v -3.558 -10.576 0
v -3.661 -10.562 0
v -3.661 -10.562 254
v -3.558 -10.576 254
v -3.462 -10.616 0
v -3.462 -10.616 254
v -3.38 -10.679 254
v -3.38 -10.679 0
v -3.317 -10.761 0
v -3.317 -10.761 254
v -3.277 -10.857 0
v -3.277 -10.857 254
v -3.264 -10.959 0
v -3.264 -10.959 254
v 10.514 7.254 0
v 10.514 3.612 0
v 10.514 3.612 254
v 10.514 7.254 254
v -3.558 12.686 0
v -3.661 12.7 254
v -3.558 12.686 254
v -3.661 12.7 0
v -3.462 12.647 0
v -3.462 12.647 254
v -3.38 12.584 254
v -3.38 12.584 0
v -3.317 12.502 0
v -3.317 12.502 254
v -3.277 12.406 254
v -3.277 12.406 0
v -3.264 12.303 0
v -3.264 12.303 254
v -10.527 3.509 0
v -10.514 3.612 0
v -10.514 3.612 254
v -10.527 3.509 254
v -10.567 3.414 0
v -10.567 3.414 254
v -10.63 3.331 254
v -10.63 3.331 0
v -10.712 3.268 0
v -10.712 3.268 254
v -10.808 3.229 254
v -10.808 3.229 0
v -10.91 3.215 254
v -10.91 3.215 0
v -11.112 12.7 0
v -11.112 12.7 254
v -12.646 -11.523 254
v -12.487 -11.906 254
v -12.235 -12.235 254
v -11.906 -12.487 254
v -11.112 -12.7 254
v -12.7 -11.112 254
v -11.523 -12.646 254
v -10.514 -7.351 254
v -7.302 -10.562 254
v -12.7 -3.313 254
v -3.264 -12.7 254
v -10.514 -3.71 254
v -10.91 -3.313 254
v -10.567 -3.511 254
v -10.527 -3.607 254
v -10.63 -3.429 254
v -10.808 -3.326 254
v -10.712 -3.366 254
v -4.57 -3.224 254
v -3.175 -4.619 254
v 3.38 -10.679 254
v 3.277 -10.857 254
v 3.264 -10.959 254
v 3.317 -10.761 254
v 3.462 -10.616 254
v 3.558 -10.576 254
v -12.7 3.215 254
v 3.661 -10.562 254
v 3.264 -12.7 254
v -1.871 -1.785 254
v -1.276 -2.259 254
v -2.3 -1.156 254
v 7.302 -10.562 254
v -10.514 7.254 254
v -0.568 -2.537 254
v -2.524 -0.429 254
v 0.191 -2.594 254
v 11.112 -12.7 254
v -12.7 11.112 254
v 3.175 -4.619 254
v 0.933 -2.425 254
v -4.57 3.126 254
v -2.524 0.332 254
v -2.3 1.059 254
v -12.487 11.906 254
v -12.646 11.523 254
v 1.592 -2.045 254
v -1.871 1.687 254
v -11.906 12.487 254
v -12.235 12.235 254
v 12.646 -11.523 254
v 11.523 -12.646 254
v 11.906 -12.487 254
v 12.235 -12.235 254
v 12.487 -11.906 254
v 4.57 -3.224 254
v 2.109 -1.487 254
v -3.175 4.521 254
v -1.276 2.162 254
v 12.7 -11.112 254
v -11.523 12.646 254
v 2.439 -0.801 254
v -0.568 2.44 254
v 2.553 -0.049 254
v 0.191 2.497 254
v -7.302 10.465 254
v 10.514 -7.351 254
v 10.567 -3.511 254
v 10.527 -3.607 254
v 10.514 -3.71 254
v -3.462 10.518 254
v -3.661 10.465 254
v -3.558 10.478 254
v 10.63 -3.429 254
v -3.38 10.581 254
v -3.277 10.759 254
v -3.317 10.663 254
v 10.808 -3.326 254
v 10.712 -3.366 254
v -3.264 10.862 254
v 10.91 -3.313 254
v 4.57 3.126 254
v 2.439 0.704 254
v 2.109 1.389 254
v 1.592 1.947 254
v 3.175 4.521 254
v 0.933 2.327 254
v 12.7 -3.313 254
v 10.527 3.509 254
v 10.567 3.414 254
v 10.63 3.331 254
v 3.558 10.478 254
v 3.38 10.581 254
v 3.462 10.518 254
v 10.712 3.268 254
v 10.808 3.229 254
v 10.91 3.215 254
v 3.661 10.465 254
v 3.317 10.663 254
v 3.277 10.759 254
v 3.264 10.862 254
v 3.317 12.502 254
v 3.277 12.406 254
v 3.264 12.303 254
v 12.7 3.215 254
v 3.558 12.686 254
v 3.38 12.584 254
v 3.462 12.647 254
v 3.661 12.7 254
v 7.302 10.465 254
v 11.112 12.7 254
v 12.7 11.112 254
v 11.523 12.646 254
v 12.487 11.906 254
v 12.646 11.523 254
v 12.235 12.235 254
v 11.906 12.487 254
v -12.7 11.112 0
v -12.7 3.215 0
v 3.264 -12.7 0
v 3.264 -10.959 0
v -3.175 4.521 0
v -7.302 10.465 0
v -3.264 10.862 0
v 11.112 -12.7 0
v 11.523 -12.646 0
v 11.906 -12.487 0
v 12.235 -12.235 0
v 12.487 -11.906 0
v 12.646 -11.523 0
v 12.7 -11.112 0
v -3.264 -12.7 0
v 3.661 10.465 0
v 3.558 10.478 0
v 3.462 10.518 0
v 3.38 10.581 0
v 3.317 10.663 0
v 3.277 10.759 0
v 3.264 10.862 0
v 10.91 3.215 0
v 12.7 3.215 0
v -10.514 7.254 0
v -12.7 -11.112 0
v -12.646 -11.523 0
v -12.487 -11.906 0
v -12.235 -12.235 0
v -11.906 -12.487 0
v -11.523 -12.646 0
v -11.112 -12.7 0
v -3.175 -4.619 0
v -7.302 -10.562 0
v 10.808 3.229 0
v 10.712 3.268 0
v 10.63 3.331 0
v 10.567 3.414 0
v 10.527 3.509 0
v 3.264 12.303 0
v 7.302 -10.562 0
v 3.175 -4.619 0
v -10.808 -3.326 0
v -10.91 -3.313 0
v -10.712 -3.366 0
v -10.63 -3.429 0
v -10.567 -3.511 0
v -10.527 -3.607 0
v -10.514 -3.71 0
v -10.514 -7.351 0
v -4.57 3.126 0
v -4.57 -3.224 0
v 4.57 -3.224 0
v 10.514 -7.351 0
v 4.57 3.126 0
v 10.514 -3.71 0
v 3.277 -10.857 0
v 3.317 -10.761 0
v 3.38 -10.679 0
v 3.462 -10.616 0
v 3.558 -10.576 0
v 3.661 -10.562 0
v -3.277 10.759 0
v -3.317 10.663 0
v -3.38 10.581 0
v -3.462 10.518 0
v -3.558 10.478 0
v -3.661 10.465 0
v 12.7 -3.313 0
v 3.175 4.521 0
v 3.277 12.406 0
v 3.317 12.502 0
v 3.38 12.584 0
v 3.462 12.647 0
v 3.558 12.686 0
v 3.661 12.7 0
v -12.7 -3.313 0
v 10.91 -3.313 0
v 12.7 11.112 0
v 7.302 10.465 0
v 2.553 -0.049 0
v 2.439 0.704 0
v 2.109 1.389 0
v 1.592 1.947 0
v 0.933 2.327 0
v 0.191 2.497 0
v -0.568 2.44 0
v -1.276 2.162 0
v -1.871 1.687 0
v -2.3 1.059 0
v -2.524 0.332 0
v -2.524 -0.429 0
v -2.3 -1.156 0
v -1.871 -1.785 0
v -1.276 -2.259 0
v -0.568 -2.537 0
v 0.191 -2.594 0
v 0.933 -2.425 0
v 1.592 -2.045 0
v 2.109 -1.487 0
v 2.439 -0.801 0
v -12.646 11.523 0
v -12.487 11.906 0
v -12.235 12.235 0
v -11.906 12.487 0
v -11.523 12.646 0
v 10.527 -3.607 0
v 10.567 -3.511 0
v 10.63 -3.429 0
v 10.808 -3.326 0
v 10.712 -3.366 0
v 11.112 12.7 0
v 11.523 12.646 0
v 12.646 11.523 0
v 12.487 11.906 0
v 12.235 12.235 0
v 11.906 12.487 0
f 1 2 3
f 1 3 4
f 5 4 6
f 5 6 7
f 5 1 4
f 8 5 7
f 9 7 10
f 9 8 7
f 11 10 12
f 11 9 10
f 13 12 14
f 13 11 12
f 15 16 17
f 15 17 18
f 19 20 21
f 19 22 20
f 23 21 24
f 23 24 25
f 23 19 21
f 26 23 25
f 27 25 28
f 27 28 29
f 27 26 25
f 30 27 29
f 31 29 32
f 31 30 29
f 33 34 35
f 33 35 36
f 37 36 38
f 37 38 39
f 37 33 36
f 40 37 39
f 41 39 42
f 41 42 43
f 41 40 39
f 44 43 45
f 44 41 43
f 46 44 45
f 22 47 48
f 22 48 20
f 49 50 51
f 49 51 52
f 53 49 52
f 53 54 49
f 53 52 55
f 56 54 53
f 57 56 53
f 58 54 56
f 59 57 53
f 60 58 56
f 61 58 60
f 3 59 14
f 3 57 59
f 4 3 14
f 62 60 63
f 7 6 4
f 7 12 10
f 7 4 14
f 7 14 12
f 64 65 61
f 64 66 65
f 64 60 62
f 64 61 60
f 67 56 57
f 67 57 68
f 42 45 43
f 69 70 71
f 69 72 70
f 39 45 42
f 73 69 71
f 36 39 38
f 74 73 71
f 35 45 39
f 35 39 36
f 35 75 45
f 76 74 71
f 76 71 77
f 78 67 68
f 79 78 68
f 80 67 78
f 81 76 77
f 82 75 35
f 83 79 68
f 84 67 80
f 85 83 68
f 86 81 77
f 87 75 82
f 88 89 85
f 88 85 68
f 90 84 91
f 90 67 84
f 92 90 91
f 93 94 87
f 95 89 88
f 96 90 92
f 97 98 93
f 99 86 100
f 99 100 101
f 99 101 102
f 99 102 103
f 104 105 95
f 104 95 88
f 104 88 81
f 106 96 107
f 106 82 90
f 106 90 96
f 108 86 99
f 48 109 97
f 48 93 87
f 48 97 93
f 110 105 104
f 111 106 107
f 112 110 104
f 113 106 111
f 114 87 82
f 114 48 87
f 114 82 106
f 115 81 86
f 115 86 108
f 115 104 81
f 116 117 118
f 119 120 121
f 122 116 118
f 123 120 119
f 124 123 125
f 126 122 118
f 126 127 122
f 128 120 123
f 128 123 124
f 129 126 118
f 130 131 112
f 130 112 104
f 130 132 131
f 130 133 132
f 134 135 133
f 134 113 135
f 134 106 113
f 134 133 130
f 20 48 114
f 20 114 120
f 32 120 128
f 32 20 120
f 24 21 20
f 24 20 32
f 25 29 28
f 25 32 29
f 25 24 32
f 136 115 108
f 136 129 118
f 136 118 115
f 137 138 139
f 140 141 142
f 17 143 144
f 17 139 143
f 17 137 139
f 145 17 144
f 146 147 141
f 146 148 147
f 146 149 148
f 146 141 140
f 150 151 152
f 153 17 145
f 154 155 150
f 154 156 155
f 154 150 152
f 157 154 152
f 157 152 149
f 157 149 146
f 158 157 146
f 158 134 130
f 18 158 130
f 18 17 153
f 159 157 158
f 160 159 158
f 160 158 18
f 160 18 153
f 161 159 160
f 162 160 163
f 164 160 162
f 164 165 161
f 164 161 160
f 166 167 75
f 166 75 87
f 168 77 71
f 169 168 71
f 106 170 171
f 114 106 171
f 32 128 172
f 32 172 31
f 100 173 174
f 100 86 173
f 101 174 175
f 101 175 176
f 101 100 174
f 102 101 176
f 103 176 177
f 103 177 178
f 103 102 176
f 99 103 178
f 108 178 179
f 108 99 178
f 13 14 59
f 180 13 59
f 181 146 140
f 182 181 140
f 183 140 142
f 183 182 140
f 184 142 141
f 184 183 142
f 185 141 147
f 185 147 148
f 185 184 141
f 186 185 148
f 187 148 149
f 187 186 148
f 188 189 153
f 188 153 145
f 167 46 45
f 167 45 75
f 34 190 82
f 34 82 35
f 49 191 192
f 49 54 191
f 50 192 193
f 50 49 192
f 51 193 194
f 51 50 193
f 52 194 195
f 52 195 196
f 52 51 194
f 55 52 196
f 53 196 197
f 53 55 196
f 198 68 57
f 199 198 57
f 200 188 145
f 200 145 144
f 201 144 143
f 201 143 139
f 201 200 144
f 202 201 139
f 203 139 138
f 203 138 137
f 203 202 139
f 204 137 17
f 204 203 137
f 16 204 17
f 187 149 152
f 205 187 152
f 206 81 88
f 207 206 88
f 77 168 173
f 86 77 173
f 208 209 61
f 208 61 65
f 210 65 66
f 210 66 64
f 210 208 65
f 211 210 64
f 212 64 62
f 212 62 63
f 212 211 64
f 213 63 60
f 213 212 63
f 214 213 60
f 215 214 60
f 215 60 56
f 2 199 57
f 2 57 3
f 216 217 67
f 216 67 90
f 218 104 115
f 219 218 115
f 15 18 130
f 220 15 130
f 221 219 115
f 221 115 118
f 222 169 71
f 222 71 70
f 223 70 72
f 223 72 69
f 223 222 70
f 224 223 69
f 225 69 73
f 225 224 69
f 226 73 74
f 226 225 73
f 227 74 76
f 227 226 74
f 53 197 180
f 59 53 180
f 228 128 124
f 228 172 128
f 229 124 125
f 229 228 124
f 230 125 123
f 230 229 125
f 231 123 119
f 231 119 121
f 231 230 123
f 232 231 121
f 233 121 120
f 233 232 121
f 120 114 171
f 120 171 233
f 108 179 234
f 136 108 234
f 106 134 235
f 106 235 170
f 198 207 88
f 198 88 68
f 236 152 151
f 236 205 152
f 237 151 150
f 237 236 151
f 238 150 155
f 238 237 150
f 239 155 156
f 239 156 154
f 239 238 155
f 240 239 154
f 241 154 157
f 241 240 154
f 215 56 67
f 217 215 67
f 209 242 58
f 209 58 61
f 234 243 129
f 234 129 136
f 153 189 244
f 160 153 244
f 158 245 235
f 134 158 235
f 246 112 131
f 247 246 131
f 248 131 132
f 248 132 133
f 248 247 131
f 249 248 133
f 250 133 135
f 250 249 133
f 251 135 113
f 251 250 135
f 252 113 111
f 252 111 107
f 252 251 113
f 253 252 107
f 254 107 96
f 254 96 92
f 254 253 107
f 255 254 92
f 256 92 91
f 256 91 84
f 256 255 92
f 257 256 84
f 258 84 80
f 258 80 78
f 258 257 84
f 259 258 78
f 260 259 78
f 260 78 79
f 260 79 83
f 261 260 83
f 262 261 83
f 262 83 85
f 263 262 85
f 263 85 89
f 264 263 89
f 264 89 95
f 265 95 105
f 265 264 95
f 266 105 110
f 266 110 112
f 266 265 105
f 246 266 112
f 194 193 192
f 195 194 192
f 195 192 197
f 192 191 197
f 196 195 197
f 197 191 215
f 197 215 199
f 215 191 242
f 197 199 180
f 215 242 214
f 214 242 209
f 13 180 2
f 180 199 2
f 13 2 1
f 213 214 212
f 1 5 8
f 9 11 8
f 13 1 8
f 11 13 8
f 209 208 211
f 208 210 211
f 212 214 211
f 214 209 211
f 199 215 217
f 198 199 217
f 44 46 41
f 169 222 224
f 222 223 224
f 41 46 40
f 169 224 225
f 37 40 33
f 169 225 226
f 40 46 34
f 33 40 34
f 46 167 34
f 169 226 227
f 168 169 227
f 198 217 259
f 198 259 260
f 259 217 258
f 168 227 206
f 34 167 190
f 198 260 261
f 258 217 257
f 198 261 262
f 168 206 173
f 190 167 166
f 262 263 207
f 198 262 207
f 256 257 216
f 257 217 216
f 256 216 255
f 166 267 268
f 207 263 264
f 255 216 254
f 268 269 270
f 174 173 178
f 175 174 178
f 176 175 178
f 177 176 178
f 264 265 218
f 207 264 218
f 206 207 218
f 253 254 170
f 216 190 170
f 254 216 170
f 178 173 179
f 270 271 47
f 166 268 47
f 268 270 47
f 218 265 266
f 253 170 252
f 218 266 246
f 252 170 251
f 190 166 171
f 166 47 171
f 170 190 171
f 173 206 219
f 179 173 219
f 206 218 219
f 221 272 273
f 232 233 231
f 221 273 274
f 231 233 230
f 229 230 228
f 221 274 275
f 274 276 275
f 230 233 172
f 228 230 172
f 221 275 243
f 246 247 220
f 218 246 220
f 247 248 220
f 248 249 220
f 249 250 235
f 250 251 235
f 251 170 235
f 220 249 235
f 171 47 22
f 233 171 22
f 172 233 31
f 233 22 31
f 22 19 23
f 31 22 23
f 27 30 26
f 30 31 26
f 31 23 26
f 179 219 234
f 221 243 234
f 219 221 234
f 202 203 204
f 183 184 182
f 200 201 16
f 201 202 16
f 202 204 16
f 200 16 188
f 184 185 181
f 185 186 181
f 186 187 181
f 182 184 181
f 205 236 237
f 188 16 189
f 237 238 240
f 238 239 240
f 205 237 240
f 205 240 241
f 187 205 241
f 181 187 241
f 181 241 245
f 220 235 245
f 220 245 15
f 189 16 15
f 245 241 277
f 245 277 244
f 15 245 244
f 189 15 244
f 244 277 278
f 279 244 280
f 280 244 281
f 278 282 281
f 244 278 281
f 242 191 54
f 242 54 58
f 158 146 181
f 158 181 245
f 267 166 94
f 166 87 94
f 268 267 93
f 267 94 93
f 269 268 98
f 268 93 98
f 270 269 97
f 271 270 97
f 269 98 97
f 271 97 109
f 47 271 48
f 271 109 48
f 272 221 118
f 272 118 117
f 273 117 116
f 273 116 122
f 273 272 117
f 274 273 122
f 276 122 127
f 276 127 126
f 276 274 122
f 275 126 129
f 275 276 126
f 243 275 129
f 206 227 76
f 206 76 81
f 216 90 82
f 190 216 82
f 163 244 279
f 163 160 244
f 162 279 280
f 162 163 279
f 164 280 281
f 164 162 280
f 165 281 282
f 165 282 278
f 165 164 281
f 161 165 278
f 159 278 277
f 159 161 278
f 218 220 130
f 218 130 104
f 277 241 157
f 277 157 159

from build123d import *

# Parameters (mm, degrees)
SKETCH1_W           = 25.4
SKETCH1_H           = 25.4
BOSS_EXTRUDE1_DEPTH = 254
FILLET1_R           = 1.5875
HOLE1_OUTLINE_R     = 2.5527
HOLE1_DEPTH         = 254
SKETCH7_W           = 6.5278
SKETCH7_H           = 2.2352
CUT_EXTRUDE2_DEPTH  = 254
FILLET4_R           = 0.396875
CIRPATTERN2_DEPTH   = 254


# Read off the part's stored shape, not the designer's step: Hole1, CirPattern2
with BuildPart() as part:
    # Sketch1 → Boss-Extrude1 (new body)
    with BuildSketch(Plane.XY):
        Rectangle(SKETCH1_W, SKETCH1_H)
    extrude(amount=BOSS_EXTRUDE1_DEPTH)

    # Fillet1
    fillet1_edges = [part.edges().sort_by_distance(p)[0] for p in [
        (12.7, -12.7, 127),
        (-12.7, -12.7, 127),
        (-12.7, 12.7, 127),
        (12.7, 12.7, 127),
    ]]
    fillet(fillet1_edges, radius=FILLET1_R)

    # Hole1 outline → Hole1 (cut)
    with BuildSketch(Plane.XY):
        with Locations((0, -0.048792482)):
            Circle(HOLE1_OUTLINE_R)
    extrude(amount=HOLE1_DEPTH, mode=Mode.SUBTRACT)

    # Sketch7 → Cut-Extrude2 (cut)
    with BuildSketch(Plane.XY.offset(254)):
        with Locations((0, 11.5824)):
            Rectangle(SKETCH7_W, SKETCH7_H)
        Polygon((-3.175, 4.5212), (-7.3025, 10.4648), (7.3025, 10.4648), (3.175, 4.5212), align=None)
    extrude(amount=-CUT_EXTRUDE2_DEPTH, mode=Mode.SUBTRACT)

    # Fillet4
    fillet4_edges = [part.edges().sort_by_distance(p)[0] for p in [
        (-3.2639, 10.4648, 127),
        (-3.2639, 12.7, 127),
        (3.2639, 12.7, 127),
        (3.2639, 10.4648, 127),
    ]]
    fillet(fillet4_edges, radius=FILLET4_R)

    # CirPattern2 outline → CirPattern2 (cut)
    with BuildSketch(Plane.XY):
        with BuildLine():
            ThreePointArc((-3.660775, -10.562384964), (-3.380141996, -10.67862696), (-3.2639, -10.959259964))
            Line((-3.2639, -10.959259964), (-3.2639, -12.7))
            Line((-3.2639, -12.7), (3.2639, -12.7))
            Line((3.2639, -12.7), (3.2639, -10.959259964))
            ThreePointArc((3.2639, -10.959259964), (3.380141996, -10.67862696), (3.660775, -10.562384964))
            Line((3.660775, -10.562384964), (7.3025, -10.562384964))
            Line((7.3025, -10.562384964), (3.175, -4.618784964))
            Line((3.175, -4.618784964), (-3.175, -4.618784964))
            Line((-3.175, -4.618784964), (-7.3025, -10.562384964))
            Line((-7.3025, -10.562384964), (-3.660775, -10.562384964))
        make_face()
        with BuildLine():
            Line((-12.7, -3.312692482), (-10.910467482, -3.312692482))
            ThreePointArc((-10.910467482, -3.312692482), (-10.629834478, -3.428934478), (-10.513592482, -3.709567482))
            Line((-10.513592482, -3.709567482), (-10.513592482, -7.351292482))
            Line((-10.513592482, -7.351292482), (-4.569992482, -3.223792482))
            Line((-4.569992482, -3.223792482), (-4.569992482, 3.126207518))
            Line((-4.569992482, 3.126207518), (-10.513592482, 7.253707518))
            Line((-10.513592482, 7.253707518), (-10.513592482, 3.611982518))
            ThreePointArc((-10.513592482, 3.611982518), (-10.629834478, 3.331349514), (-10.910467482, 3.215107518))
            Line((-10.910467482, 3.215107518), (-12.7, 3.215107518))
            Line((-12.7, 3.215107518), (-12.7, -3.312692482))
        make_face()
        with BuildLine():
            ThreePointArc((10.513592482, -3.709567482), (10.629834478, -3.428934478), (10.910467482, -3.312692482))
            Line((10.910467482, -3.312692482), (12.7, -3.312692482))
            Line((12.7, -3.312692482), (12.7, 3.215107518))
            Line((12.7, 3.215107518), (10.910467482, 3.215107518))
            ThreePointArc((10.910467482, 3.215107518), (10.629834478, 3.331349514), (10.513592482, 3.611982518))
            Line((10.513592482, 3.611982518), (10.513592482, 7.253707518))
            Line((10.513592482, 7.253707518), (4.569992482, 3.126207518))
            Line((4.569992482, 3.126207518), (4.569992482, -3.223792482))
            Line((4.569992482, -3.223792482), (10.513592482, -7.351292482))
            Line((10.513592482, -7.351292482), (10.513592482, -3.709567482))
        make_face()
    extrude(amount=CIRPATTERN2_DEPTH, mode=Mode.SUBTRACT)


solid = part.part
